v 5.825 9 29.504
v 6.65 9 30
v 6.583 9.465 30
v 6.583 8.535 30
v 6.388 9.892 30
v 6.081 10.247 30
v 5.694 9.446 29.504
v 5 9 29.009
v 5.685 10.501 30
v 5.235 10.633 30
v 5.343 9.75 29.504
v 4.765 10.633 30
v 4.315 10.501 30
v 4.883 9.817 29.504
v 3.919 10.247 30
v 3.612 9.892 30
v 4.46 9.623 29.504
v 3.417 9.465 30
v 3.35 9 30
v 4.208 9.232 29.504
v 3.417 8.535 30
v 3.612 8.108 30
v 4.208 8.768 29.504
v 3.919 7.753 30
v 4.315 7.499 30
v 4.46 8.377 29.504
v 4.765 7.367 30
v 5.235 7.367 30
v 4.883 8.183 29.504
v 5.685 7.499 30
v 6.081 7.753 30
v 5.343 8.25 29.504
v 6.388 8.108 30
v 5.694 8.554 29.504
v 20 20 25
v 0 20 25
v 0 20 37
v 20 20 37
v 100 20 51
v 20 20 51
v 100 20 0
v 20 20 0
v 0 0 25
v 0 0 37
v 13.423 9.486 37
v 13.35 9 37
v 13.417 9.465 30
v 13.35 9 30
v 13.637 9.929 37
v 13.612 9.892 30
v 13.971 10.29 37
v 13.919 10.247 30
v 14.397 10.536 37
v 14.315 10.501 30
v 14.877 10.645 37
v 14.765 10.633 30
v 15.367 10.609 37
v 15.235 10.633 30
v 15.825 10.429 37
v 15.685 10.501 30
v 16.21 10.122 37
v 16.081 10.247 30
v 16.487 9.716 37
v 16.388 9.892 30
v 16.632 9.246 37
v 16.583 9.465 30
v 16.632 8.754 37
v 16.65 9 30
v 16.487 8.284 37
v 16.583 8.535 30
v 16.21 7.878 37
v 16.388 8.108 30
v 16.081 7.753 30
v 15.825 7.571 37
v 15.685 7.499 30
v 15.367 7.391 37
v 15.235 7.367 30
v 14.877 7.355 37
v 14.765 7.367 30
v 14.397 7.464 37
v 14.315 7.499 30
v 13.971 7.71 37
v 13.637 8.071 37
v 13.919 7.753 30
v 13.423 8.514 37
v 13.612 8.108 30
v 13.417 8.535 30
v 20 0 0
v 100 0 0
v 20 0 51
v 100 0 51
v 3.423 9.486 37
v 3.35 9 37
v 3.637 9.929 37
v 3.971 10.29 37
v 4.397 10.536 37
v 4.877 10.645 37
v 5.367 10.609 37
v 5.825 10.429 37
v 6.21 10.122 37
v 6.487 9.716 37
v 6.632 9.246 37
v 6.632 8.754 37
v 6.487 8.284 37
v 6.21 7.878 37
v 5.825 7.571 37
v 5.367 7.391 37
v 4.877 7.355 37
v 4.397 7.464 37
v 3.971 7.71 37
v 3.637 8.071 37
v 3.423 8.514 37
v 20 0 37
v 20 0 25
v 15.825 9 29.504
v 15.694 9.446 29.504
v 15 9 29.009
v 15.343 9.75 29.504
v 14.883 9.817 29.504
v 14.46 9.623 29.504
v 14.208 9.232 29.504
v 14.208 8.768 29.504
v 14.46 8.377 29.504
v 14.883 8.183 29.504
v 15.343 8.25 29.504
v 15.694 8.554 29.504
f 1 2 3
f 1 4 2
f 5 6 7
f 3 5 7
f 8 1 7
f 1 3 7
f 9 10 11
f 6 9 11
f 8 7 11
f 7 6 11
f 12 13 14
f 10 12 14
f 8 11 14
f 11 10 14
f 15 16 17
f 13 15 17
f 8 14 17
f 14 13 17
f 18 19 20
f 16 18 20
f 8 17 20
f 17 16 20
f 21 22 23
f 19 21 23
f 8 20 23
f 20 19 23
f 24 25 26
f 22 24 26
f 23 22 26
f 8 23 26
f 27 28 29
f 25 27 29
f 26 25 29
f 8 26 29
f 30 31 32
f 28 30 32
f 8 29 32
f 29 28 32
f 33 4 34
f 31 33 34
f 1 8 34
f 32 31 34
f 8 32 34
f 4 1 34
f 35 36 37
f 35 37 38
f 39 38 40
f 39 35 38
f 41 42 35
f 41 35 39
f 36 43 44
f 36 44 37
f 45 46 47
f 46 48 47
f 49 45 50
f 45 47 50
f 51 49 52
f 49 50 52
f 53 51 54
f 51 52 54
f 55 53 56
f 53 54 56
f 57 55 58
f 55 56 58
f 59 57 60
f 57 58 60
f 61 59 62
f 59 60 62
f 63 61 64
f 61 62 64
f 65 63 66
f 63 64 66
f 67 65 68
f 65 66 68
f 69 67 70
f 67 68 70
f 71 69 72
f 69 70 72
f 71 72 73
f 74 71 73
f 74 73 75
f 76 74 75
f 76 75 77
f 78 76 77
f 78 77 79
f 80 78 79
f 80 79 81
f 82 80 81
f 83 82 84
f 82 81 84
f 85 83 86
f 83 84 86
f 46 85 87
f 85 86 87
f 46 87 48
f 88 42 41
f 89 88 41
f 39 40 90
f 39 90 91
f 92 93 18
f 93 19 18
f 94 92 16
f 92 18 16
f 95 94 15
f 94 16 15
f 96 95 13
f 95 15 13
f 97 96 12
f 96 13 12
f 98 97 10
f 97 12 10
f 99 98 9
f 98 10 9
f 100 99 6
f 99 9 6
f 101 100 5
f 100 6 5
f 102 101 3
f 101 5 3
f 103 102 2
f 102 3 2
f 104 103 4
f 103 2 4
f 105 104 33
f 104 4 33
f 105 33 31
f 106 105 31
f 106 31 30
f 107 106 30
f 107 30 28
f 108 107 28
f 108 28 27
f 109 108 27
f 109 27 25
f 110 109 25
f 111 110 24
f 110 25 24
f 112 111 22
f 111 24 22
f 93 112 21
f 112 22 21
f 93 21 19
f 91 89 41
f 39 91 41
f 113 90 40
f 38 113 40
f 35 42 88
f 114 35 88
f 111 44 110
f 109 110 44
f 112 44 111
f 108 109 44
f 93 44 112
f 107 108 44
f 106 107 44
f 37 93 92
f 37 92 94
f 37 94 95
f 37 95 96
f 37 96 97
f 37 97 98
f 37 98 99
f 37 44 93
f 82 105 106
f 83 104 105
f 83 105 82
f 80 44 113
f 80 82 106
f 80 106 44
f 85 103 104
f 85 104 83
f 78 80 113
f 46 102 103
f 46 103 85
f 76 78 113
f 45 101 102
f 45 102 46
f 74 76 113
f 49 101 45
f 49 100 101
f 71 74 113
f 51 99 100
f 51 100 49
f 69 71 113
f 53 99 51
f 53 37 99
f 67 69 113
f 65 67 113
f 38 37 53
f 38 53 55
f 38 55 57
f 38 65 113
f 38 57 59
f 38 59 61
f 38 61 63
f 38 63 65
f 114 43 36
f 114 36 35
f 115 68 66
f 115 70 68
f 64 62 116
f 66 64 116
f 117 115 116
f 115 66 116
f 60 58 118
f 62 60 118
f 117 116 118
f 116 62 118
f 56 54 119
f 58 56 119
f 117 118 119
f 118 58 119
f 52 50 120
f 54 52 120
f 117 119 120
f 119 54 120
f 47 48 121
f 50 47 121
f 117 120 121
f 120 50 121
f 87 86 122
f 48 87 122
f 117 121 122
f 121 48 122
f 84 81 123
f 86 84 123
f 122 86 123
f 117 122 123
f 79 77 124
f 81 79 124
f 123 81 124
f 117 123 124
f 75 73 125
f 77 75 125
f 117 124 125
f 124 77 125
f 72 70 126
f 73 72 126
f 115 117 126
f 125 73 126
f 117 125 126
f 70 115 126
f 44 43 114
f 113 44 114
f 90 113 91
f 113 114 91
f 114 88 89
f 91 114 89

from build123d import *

# Parameters (mm, degrees)
F0_W     = 100
F0_H     = 20
F1_DEPTH = 51
F2_W     = 20
F2_H     = 20
F3_DEPTH = 14
F5_D     = 3.3
F5_DEPTH = 7
F5_TIP   = 0.9914200214
F6_W     = 20
F6_H     = 20
F7_DEPTH = 25


with BuildPart() as f1:
    # F0 (on Top) → F1 (new body)
    with BuildSketch(Plane.XY):
        with Locations((50, 10)):
            Rectangle(F0_W, F0_H)
    extrude(amount=F1_DEPTH)

    # F2 (on face) → F3 (cut)
    with BuildSketch(Plane.XY.offset(51)):
        with Locations((10, 10)):
            Rectangle(F2_W, F2_H)
    extrude(amount=-F3_DEPTH, mode=Mode.SUBTRACT)

    # F5
    with Locations(Plane.XY.offset(37)):
        with Locations((5, 9), (15, 9)):
            Hole(F5_D / 2, depth=F5_DEPTH)
            with Locations((0, 0, -(F5_DEPTH + F5_TIP / 2))):  # 118° drill point
                Cone(0, F5_D / 2, F5_TIP, mode=Mode.SUBTRACT)

    # F6 (on face) → F7 (cut)
    with BuildSketch(Plane(origin=(0, 0, 0), x_dir=(1, 0, 0), z_dir=(0, 0, -1))):
        with Locations((10, -10)):
            Rectangle(F6_W, F6_H)
    extrude(amount=-F7_DEPTH, mode=Mode.SUBTRACT)


solid = f1.part
